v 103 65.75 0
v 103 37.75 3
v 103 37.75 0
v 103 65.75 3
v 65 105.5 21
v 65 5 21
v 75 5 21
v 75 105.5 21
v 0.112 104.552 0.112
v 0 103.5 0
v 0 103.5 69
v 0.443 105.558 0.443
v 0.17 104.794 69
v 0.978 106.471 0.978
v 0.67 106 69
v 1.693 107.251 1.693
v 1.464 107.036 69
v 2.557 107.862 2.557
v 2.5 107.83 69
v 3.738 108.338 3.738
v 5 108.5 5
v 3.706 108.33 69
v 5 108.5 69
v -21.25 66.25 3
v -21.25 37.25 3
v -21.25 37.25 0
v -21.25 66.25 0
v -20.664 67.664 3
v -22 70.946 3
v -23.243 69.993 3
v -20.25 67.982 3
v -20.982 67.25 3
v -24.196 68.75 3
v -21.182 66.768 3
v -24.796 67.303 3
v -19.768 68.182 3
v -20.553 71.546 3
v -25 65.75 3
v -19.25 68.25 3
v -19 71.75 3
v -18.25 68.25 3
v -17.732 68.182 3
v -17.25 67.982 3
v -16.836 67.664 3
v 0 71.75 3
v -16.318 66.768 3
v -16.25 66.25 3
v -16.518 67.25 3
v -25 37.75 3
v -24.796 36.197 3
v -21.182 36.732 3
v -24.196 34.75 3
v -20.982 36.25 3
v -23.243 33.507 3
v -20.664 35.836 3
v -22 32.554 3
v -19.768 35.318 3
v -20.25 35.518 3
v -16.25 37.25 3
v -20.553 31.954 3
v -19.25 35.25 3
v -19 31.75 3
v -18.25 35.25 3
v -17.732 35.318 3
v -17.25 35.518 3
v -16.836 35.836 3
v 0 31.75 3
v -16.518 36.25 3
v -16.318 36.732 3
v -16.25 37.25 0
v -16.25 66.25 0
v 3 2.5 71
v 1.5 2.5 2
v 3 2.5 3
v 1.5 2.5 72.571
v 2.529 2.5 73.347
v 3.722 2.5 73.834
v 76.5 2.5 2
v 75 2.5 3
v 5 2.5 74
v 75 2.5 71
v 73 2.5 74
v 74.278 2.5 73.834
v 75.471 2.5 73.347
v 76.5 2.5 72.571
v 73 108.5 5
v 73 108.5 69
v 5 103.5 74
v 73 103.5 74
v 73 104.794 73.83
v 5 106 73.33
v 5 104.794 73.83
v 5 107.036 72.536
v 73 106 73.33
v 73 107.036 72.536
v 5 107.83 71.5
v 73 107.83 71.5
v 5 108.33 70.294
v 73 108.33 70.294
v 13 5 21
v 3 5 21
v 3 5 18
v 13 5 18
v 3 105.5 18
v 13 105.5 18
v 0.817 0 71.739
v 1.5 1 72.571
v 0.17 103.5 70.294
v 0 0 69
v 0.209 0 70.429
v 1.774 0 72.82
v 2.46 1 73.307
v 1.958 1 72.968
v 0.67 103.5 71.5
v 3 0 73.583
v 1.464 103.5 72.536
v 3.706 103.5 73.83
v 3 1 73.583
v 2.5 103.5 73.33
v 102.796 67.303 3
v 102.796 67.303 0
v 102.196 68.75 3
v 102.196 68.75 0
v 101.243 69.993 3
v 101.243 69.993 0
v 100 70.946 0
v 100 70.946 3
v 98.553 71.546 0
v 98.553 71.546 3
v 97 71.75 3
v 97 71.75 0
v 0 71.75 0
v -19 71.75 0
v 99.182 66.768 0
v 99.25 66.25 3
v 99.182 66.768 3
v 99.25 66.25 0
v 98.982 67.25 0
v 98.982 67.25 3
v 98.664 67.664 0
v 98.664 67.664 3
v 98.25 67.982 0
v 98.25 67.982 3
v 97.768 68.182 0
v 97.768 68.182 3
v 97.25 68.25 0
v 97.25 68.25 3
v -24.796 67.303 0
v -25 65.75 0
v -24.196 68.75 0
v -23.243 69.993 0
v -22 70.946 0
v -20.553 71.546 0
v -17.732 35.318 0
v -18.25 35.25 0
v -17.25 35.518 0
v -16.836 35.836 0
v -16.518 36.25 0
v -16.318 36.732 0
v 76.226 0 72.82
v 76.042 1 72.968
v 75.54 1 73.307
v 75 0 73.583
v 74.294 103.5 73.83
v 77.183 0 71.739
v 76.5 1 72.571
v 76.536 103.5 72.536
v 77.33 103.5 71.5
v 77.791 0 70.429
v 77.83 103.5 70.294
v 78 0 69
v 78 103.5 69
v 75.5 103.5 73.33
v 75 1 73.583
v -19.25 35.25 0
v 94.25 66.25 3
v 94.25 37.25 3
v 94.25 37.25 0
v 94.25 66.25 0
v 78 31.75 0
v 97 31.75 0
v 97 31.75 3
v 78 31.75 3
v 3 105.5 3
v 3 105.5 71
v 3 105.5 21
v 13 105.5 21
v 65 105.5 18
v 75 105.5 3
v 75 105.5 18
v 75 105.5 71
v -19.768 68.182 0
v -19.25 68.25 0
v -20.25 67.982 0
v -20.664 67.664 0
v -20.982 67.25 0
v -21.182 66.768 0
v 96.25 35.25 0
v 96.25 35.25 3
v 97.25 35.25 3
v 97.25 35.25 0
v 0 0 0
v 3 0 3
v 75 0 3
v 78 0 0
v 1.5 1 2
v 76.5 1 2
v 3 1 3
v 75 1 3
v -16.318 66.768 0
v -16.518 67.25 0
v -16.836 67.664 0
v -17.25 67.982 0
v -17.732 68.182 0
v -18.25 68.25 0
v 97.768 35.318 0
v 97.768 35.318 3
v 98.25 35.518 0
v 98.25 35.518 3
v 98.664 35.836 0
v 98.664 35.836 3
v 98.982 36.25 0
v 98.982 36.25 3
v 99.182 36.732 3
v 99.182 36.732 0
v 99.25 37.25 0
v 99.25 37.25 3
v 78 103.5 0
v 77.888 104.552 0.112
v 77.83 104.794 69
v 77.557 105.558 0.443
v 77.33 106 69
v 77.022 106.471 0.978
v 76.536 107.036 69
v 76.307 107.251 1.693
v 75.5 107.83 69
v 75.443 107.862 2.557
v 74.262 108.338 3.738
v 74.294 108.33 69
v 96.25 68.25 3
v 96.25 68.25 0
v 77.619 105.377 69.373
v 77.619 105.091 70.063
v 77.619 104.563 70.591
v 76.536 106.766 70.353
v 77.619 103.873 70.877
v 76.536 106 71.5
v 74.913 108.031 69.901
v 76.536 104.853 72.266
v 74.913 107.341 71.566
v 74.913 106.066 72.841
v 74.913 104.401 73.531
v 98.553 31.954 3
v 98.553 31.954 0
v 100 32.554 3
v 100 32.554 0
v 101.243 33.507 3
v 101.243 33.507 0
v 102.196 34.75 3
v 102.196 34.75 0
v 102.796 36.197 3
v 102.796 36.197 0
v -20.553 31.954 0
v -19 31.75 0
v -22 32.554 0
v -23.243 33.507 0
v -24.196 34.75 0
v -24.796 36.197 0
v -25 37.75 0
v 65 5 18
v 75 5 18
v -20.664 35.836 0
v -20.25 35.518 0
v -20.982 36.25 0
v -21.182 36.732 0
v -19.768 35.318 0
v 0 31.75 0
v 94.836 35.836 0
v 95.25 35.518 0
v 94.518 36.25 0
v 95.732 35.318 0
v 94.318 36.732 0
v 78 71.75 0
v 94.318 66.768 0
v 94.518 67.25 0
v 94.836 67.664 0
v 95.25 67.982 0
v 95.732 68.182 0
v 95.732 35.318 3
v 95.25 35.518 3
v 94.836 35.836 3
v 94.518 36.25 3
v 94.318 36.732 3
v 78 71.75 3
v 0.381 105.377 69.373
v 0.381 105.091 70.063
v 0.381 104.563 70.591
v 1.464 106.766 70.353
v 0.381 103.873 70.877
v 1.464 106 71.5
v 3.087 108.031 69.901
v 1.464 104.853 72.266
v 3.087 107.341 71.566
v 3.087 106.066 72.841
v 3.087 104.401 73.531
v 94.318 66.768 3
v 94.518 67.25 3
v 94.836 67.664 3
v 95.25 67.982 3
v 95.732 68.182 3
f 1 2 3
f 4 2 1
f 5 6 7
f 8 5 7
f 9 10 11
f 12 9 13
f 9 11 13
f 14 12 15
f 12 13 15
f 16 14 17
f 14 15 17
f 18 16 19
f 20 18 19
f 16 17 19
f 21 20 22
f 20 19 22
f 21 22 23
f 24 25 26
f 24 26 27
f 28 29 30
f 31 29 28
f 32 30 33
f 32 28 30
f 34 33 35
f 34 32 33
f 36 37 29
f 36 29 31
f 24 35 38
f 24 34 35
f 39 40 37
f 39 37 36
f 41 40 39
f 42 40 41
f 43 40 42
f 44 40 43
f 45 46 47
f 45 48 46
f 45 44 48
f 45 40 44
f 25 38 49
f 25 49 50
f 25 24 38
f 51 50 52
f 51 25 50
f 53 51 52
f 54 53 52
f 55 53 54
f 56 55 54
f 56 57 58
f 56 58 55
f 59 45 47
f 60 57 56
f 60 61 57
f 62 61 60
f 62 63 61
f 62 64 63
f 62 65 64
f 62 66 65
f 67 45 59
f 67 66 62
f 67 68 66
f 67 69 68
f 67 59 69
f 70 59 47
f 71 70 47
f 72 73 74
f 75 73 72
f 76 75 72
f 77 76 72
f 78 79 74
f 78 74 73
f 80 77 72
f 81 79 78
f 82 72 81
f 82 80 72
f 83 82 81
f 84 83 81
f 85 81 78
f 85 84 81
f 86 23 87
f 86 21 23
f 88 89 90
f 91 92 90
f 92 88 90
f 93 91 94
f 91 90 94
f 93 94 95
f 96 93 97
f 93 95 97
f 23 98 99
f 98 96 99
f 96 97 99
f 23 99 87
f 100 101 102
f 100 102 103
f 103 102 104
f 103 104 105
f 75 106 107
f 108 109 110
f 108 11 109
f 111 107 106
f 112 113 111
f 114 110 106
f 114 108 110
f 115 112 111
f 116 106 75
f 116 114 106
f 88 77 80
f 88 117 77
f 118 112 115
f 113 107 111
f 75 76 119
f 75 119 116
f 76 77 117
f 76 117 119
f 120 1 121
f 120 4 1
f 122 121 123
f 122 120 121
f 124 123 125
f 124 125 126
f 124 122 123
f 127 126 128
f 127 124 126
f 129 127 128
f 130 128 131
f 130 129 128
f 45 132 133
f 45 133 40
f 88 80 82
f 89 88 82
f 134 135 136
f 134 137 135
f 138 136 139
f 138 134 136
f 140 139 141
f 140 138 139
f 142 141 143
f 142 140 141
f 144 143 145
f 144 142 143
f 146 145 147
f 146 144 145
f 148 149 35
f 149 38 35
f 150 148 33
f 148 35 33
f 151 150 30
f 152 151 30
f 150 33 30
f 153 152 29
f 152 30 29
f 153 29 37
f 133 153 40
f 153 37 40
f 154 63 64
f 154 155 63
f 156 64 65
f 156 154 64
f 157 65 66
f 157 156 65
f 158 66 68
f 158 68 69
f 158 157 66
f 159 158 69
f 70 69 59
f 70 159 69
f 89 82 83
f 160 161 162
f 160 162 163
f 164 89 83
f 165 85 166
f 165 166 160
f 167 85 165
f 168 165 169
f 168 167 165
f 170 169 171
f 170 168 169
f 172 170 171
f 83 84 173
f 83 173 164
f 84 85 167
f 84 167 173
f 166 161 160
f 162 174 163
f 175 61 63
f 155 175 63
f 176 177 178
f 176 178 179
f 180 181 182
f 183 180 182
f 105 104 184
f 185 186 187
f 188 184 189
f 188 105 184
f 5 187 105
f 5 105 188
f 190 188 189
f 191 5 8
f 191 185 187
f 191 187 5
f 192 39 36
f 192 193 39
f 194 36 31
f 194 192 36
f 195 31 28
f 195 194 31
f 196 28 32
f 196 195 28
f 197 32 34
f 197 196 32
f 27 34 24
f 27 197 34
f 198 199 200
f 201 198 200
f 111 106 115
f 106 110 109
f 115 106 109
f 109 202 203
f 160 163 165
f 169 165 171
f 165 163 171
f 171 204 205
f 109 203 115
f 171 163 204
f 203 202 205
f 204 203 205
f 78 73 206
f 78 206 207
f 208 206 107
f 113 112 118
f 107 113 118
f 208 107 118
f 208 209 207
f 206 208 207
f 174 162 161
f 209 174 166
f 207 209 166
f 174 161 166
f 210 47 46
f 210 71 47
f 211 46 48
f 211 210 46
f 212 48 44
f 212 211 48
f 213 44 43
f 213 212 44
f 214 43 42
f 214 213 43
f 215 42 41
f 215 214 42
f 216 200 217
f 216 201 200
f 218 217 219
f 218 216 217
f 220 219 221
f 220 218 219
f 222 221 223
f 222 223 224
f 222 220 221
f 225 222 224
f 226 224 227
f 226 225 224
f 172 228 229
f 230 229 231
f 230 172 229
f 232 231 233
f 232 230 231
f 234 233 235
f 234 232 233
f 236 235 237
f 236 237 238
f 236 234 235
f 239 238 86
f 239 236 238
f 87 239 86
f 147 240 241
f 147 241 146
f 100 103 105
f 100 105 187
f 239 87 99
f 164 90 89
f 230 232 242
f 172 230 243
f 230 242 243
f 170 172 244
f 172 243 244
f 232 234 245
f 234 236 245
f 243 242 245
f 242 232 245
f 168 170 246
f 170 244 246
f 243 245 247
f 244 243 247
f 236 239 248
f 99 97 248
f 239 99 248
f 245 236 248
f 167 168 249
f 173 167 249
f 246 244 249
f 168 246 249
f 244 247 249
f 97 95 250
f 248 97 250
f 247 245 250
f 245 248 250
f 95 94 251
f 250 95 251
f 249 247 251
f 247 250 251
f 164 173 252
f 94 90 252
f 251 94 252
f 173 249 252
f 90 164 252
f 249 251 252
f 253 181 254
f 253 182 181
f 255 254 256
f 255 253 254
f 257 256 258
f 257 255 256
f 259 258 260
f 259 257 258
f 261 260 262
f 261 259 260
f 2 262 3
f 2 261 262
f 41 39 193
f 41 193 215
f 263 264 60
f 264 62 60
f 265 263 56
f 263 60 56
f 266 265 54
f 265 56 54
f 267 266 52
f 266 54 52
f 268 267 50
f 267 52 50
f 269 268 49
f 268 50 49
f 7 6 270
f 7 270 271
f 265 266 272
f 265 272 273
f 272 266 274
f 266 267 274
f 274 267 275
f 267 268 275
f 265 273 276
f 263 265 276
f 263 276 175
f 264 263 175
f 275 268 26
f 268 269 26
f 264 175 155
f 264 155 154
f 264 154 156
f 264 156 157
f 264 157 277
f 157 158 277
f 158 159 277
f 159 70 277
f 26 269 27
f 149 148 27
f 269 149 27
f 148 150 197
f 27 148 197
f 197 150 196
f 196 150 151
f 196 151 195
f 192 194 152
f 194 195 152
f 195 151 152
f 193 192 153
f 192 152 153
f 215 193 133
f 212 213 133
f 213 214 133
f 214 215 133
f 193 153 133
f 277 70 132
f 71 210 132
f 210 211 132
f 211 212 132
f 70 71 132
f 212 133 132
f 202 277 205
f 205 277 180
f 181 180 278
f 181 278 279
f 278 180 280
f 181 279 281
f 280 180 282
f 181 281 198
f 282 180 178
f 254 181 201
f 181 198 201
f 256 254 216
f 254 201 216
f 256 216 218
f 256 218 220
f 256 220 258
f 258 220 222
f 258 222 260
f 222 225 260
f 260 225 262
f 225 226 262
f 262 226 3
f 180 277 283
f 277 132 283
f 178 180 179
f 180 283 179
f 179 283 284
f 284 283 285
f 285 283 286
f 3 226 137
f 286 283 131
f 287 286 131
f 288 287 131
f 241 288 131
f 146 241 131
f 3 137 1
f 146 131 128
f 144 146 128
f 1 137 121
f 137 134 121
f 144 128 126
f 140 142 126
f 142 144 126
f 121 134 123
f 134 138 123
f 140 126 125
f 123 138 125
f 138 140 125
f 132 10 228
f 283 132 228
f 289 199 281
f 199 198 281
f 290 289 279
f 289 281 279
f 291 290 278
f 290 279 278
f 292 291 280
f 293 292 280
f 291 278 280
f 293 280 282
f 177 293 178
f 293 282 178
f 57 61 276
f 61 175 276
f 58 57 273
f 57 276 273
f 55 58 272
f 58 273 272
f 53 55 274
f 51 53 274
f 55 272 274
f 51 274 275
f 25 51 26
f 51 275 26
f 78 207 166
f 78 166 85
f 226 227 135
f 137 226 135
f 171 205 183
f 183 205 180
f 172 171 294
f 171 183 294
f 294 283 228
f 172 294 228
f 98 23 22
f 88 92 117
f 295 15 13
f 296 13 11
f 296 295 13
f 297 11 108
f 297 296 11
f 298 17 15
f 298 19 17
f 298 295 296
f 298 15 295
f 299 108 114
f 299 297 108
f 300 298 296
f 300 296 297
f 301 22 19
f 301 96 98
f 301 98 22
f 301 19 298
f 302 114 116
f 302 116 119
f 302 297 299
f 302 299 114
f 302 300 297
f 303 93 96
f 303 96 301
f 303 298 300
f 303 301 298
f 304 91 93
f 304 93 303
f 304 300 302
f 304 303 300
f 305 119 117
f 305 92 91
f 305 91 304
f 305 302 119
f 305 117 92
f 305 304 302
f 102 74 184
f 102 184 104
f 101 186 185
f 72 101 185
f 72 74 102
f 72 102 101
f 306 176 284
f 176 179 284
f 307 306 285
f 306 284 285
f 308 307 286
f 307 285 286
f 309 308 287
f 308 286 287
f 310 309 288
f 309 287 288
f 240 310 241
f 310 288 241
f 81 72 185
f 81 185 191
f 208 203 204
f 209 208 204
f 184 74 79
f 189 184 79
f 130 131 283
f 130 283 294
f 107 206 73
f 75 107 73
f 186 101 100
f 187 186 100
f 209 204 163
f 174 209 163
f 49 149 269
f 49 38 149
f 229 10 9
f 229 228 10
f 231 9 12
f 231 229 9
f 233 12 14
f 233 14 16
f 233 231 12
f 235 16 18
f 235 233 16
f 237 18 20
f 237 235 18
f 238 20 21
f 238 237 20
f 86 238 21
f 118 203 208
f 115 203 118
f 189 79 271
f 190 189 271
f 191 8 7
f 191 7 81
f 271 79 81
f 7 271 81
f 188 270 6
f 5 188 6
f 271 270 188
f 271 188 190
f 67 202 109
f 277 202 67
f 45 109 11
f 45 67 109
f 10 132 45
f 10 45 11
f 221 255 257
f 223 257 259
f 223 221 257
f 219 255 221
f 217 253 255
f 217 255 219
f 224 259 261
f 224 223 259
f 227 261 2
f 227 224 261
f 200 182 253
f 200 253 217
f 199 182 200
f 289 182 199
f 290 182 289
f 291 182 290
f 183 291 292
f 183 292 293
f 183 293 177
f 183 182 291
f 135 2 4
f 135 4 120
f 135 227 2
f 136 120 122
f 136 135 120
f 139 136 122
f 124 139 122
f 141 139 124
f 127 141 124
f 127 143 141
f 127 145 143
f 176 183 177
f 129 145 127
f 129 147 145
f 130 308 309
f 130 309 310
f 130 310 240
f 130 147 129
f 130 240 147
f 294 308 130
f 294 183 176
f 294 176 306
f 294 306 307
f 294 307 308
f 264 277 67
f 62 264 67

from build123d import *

# Parameters (mm, degrees)
BOX_W           = 78
BOX_H           = 108.5
BOX_DEPTH       = 74
SKETCH_W        = 72
SKETCH_H        = 50
POCKET_DEPTH    = 105.5
SKETCH001_W     = 72
SKETCH001_H     = 15
POCKET001_DEPTH = 105.5
SKETCH002_W     = 52
SKETCH002_H     = 3
POCKET002_DEPTH = 105.5
SKETCH008_W     = 75
SKETCH008_H     = 1.5
POCKET005_DEPTH = 72
SKETCH009_W     = 10
SKETCH009_H     = 3
POCKET006_DEPTH = 5
SKETCH010_W     = 10
SKETCH010_H     = 3
POCKET007_DEPTH = 5
SKETCH011_W     = 72
SKETCH011_H     = 3
POCKET008_DEPTH = 2.5
FILLET_R        = 5
SKETCH018_W     = 40
SKETCH018_H     = 3
PAD_DEPTH       = 25
SKETCH019_W     = 40
SKETCH019_H     = 3
PAD001_DEPTH    = 25
SKETCH020_W     = 5
SKETCH020_H     = 33
POCKET010_DEPTH = 3.001
SKETCH021_W     = 5
SKETCH021_H     = 33
POCKET011_DEPTH = 3.001
FILLET002_R     = 2
FILLET003_R     = 6


with BuildPart() as part:
    # Box → Box (new body)
    with BuildSketch(Plane.XY):
        with Locations((39, 54.25)):
            Rectangle(BOX_W, BOX_H)
    extrude(amount=BOX_DEPTH)

    # Sketch (on Face3 of BaseFeature) → Pocket (cut)
    with BuildSketch(Plane.XZ):
        with Locations((39, 46)):
            Rectangle(SKETCH_W, SKETCH_H)
    extrude(amount=-POCKET_DEPTH, mode=Mode.SUBTRACT)

    # Sketch001 (on Face2 of Pocket) → Pocket001 (cut)
    with BuildSketch(Plane.XZ):
        with Locations((39, 10.5)):
            Rectangle(SKETCH001_W, SKETCH001_H)
    extrude(amount=-POCKET001_DEPTH, mode=Mode.SUBTRACT)

    # Sketch002 (on Face2 of Pocket001) → Pocket002 (cut)
    with BuildSketch(Plane.XZ):
        with Locations((39, 19.5)):
            Rectangle(SKETCH002_W, SKETCH002_H)
    extrude(amount=-POCKET002_DEPTH, mode=Mode.SUBTRACT)

    # Sketch008 (on Face3 of Pocket002) → Pocket005 (cut)
    with BuildSketch(Plane.XY.offset(74)):
        with Locations((39, 1.75)):
            Rectangle(SKETCH008_W, SKETCH008_H)
    extrude(amount=-POCKET005_DEPTH, mode=Mode.SUBTRACT)

    # Sketch009 (on Face2 of Pocket005) → Pocket006 (cut)
    with BuildSketch(Plane.XZ):
        with Locations((8, 19.5)):
            Rectangle(SKETCH009_W, SKETCH009_H)
    extrude(amount=-POCKET006_DEPTH, mode=Mode.SUBTRACT)

    # Sketch010 (on Face2 of Pocket006) → Pocket007 (cut)
    with BuildSketch(Plane.XZ):
        with Locations((70, 19.5)):
            Rectangle(SKETCH010_W, SKETCH010_H)
    extrude(amount=-POCKET007_DEPTH, mode=Mode.SUBTRACT)

    # Sketch011 (on Face2 of Pocket007) → Pocket008 (cut)
    with BuildSketch(Plane.XZ):
        with Locations((39, 72.5)):
            Rectangle(SKETCH011_W, SKETCH011_H)
    extrude(amount=-POCKET008_DEPTH, mode=Mode.SUBTRACT)

    # Fillet
    fillet_edges = [part.edges().sort_by_distance(p)[0] for p in [
        (39, 108.5, 74),
        (78, 108.5, 37),
        (39, 108.5, 0),
        (0, 108.5, 37),
        (78, 54.25, 74),
        (0, 54.25, 74),
    ]]
    fillet(fillet_edges, radius=FILLET_R)

    # Sketch018 (on Face6 of Fillet) → Pad (join)
    with BuildSketch(Plane.YZ.offset(78)):
        with Locations((51.75, 1.5)):
            Rectangle(SKETCH018_W, SKETCH018_H)
    extrude(amount=PAD_DEPTH)

    # Sketch019 (on Face1 of Pad) → Pad001 (join)
    with BuildSketch(Plane(origin=(0, 0, 0), x_dir=(0, -1, 0), z_dir=(-1, 0, 0))):
        with Locations((-51.75, 1.5)):
            Rectangle(SKETCH019_W, SKETCH019_H)
    extrude(amount=PAD001_DEPTH)

    # Sketch020 (on Face32 of Pad001) → Pocket010 (cut, through all)
    with BuildSketch(Plane.XY.offset(3)):
        with Locations((96.75, 51.75)):
            Rectangle(SKETCH020_W, SKETCH020_H)
    extrude(amount=-POCKET010_DEPTH, mode=Mode.SUBTRACT)

    # Sketch021 (on Face6 of Pocket010) → Pocket011 (cut, through all)
    with BuildSketch(Plane.XY.offset(3)):
        with Locations((-18.75, 51.75)):
            Rectangle(SKETCH021_W, SKETCH021_H)
    extrude(amount=-POCKET011_DEPTH, mode=Mode.SUBTRACT)

    # Fillet002
    fillet002_edges = [part.edges().sort_by_distance(p)[0] for p in [
        (99.25, 68.25, 1.5),
        (99.25, 35.25, 1.5),
        (94.25, 35.25, 1.5),
        (94.25, 68.25, 1.5),
        (-21.25, 68.25, 1.5),
        (-16.25, 68.25, 1.5),
        (-16.25, 35.25, 1.5),
        (-21.25, 35.25, 1.5),
    ]]
    fillet(fillet002_edges, radius=FILLET002_R)

    # Fillet003
    fillet003_edges = [part.edges().sort_by_distance(p)[0] for p in [
        (103, 71.75, 1.5),
        (103, 31.75, 1.5),
        (-25, 71.75, 1.5),
        (-25, 31.75, 1.5),
    ]]
    fillet(fillet003_edges, radius=FILLET003_R)


solid = part.part
